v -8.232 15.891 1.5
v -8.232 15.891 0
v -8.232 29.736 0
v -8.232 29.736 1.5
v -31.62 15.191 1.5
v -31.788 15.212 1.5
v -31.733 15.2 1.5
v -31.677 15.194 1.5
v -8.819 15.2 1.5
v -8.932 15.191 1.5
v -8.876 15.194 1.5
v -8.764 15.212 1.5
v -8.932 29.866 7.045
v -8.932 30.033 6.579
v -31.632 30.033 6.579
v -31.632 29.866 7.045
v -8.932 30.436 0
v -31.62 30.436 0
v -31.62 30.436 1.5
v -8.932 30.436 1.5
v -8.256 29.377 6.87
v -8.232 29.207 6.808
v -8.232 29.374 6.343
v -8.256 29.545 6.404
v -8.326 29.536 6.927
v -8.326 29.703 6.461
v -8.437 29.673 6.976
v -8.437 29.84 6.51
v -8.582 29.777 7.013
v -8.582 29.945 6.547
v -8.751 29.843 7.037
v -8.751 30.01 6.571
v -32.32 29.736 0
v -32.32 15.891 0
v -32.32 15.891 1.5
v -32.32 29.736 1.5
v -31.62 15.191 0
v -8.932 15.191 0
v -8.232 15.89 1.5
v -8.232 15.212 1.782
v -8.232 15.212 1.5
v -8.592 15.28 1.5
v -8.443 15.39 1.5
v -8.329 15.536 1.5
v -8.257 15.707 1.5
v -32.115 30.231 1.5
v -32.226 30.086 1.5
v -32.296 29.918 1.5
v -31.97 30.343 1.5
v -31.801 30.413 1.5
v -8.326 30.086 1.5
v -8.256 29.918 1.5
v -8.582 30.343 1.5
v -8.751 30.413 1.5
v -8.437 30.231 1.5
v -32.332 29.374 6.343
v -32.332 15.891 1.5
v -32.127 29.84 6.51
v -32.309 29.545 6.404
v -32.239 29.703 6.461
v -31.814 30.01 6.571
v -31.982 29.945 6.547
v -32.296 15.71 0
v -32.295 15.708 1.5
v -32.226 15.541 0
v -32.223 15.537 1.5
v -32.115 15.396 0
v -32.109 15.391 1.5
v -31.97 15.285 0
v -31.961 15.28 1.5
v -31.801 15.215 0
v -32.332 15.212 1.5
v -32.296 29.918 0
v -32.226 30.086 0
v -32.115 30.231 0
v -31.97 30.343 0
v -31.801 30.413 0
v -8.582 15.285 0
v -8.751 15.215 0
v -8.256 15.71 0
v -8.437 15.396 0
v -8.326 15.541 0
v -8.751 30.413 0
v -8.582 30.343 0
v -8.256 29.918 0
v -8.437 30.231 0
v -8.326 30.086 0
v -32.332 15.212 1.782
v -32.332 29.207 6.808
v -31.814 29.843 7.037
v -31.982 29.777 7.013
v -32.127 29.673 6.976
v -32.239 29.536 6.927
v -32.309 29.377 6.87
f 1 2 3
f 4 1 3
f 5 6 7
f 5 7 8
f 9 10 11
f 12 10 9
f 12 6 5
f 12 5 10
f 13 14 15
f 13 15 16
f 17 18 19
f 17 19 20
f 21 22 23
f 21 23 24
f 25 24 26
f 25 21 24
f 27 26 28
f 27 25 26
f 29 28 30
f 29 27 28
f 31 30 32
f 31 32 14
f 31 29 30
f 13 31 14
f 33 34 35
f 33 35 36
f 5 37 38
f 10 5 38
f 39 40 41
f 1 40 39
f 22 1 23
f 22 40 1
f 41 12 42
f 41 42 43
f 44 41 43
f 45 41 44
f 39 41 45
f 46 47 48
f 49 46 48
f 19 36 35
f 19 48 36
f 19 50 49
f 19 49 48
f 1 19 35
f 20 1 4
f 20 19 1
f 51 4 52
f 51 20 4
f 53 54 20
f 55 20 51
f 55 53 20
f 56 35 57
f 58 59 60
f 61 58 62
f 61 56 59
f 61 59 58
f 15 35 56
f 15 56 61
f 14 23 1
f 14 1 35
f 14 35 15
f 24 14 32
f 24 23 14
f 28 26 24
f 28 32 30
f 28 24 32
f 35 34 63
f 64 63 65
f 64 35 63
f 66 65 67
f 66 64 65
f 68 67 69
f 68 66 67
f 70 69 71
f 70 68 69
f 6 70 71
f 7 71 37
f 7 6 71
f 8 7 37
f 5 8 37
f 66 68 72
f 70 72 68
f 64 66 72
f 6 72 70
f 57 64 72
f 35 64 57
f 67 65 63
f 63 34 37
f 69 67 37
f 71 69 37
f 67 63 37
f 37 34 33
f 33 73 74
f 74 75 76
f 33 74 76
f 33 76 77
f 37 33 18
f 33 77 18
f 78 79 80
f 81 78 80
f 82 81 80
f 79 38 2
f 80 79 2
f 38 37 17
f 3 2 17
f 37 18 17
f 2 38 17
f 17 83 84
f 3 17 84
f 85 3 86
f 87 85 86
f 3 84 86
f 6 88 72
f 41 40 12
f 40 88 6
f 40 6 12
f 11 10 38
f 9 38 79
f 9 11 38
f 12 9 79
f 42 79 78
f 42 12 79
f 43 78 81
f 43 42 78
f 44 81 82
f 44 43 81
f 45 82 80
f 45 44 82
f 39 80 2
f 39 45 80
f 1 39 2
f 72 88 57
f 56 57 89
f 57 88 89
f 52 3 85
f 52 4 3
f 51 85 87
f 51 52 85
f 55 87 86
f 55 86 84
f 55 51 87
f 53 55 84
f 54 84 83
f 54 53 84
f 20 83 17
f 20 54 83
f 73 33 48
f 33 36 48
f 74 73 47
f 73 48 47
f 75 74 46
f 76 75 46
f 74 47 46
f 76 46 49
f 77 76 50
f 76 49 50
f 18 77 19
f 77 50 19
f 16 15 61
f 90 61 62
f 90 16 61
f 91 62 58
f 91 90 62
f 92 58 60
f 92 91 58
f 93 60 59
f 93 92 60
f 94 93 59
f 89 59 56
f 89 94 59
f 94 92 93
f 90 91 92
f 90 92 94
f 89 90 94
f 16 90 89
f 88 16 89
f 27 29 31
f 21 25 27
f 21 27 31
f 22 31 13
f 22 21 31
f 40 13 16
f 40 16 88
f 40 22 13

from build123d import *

# Parameters (mm, degrees)
F0_W     = 24.087439
F0_H     = 15.245215
F1_DEPTH = 1.5
F2_R     = 0.7
F4_DEPTH = 24.1
F5_R     = 0.7


with BuildPart() as f1:
    # F0 (on Top) → F1 (new body)
    with BuildSketch(Plane.XY):
        with Locations((-20.276139, 22.81383)):
            Rectangle(F0_W, F0_H)
    extrude(amount=F1_DEPTH)

    # F2
    f2_edges = [f1.edges().sort_by_distance(p)[0] for p in [
        (-32.319859, 30.436438, 0.75),
        (-32.319859, 15.191223, 0.75),
        (-8.23242, 30.436438, 0.75),
        (-8.23242, 15.191223, 0.75),
    ]]
    fillet(f2_edges, radius=F2_R)

    # F3 (on face) → F4 (join)
    with BuildSketch(Plane.YZ.offset(-8.23242)):
        Polygon((15.211802, 1.5), (15.891223, 1.5), (30.032871, 6.57918), (29.865546, 7.045054), (15.211802, 1.781947), align=None)
    extrude(amount=-F4_DEPTH)

    # F5
    f5_edges = [f1.edges().sort_by_distance(p)[0] for p in [
        (-32.33242, 29.949209, 6.812117),
        (-8.23242, 29.949209, 6.812117),
    ]]
    fillet(f5_edges, radius=F5_R)


solid = f1.part
